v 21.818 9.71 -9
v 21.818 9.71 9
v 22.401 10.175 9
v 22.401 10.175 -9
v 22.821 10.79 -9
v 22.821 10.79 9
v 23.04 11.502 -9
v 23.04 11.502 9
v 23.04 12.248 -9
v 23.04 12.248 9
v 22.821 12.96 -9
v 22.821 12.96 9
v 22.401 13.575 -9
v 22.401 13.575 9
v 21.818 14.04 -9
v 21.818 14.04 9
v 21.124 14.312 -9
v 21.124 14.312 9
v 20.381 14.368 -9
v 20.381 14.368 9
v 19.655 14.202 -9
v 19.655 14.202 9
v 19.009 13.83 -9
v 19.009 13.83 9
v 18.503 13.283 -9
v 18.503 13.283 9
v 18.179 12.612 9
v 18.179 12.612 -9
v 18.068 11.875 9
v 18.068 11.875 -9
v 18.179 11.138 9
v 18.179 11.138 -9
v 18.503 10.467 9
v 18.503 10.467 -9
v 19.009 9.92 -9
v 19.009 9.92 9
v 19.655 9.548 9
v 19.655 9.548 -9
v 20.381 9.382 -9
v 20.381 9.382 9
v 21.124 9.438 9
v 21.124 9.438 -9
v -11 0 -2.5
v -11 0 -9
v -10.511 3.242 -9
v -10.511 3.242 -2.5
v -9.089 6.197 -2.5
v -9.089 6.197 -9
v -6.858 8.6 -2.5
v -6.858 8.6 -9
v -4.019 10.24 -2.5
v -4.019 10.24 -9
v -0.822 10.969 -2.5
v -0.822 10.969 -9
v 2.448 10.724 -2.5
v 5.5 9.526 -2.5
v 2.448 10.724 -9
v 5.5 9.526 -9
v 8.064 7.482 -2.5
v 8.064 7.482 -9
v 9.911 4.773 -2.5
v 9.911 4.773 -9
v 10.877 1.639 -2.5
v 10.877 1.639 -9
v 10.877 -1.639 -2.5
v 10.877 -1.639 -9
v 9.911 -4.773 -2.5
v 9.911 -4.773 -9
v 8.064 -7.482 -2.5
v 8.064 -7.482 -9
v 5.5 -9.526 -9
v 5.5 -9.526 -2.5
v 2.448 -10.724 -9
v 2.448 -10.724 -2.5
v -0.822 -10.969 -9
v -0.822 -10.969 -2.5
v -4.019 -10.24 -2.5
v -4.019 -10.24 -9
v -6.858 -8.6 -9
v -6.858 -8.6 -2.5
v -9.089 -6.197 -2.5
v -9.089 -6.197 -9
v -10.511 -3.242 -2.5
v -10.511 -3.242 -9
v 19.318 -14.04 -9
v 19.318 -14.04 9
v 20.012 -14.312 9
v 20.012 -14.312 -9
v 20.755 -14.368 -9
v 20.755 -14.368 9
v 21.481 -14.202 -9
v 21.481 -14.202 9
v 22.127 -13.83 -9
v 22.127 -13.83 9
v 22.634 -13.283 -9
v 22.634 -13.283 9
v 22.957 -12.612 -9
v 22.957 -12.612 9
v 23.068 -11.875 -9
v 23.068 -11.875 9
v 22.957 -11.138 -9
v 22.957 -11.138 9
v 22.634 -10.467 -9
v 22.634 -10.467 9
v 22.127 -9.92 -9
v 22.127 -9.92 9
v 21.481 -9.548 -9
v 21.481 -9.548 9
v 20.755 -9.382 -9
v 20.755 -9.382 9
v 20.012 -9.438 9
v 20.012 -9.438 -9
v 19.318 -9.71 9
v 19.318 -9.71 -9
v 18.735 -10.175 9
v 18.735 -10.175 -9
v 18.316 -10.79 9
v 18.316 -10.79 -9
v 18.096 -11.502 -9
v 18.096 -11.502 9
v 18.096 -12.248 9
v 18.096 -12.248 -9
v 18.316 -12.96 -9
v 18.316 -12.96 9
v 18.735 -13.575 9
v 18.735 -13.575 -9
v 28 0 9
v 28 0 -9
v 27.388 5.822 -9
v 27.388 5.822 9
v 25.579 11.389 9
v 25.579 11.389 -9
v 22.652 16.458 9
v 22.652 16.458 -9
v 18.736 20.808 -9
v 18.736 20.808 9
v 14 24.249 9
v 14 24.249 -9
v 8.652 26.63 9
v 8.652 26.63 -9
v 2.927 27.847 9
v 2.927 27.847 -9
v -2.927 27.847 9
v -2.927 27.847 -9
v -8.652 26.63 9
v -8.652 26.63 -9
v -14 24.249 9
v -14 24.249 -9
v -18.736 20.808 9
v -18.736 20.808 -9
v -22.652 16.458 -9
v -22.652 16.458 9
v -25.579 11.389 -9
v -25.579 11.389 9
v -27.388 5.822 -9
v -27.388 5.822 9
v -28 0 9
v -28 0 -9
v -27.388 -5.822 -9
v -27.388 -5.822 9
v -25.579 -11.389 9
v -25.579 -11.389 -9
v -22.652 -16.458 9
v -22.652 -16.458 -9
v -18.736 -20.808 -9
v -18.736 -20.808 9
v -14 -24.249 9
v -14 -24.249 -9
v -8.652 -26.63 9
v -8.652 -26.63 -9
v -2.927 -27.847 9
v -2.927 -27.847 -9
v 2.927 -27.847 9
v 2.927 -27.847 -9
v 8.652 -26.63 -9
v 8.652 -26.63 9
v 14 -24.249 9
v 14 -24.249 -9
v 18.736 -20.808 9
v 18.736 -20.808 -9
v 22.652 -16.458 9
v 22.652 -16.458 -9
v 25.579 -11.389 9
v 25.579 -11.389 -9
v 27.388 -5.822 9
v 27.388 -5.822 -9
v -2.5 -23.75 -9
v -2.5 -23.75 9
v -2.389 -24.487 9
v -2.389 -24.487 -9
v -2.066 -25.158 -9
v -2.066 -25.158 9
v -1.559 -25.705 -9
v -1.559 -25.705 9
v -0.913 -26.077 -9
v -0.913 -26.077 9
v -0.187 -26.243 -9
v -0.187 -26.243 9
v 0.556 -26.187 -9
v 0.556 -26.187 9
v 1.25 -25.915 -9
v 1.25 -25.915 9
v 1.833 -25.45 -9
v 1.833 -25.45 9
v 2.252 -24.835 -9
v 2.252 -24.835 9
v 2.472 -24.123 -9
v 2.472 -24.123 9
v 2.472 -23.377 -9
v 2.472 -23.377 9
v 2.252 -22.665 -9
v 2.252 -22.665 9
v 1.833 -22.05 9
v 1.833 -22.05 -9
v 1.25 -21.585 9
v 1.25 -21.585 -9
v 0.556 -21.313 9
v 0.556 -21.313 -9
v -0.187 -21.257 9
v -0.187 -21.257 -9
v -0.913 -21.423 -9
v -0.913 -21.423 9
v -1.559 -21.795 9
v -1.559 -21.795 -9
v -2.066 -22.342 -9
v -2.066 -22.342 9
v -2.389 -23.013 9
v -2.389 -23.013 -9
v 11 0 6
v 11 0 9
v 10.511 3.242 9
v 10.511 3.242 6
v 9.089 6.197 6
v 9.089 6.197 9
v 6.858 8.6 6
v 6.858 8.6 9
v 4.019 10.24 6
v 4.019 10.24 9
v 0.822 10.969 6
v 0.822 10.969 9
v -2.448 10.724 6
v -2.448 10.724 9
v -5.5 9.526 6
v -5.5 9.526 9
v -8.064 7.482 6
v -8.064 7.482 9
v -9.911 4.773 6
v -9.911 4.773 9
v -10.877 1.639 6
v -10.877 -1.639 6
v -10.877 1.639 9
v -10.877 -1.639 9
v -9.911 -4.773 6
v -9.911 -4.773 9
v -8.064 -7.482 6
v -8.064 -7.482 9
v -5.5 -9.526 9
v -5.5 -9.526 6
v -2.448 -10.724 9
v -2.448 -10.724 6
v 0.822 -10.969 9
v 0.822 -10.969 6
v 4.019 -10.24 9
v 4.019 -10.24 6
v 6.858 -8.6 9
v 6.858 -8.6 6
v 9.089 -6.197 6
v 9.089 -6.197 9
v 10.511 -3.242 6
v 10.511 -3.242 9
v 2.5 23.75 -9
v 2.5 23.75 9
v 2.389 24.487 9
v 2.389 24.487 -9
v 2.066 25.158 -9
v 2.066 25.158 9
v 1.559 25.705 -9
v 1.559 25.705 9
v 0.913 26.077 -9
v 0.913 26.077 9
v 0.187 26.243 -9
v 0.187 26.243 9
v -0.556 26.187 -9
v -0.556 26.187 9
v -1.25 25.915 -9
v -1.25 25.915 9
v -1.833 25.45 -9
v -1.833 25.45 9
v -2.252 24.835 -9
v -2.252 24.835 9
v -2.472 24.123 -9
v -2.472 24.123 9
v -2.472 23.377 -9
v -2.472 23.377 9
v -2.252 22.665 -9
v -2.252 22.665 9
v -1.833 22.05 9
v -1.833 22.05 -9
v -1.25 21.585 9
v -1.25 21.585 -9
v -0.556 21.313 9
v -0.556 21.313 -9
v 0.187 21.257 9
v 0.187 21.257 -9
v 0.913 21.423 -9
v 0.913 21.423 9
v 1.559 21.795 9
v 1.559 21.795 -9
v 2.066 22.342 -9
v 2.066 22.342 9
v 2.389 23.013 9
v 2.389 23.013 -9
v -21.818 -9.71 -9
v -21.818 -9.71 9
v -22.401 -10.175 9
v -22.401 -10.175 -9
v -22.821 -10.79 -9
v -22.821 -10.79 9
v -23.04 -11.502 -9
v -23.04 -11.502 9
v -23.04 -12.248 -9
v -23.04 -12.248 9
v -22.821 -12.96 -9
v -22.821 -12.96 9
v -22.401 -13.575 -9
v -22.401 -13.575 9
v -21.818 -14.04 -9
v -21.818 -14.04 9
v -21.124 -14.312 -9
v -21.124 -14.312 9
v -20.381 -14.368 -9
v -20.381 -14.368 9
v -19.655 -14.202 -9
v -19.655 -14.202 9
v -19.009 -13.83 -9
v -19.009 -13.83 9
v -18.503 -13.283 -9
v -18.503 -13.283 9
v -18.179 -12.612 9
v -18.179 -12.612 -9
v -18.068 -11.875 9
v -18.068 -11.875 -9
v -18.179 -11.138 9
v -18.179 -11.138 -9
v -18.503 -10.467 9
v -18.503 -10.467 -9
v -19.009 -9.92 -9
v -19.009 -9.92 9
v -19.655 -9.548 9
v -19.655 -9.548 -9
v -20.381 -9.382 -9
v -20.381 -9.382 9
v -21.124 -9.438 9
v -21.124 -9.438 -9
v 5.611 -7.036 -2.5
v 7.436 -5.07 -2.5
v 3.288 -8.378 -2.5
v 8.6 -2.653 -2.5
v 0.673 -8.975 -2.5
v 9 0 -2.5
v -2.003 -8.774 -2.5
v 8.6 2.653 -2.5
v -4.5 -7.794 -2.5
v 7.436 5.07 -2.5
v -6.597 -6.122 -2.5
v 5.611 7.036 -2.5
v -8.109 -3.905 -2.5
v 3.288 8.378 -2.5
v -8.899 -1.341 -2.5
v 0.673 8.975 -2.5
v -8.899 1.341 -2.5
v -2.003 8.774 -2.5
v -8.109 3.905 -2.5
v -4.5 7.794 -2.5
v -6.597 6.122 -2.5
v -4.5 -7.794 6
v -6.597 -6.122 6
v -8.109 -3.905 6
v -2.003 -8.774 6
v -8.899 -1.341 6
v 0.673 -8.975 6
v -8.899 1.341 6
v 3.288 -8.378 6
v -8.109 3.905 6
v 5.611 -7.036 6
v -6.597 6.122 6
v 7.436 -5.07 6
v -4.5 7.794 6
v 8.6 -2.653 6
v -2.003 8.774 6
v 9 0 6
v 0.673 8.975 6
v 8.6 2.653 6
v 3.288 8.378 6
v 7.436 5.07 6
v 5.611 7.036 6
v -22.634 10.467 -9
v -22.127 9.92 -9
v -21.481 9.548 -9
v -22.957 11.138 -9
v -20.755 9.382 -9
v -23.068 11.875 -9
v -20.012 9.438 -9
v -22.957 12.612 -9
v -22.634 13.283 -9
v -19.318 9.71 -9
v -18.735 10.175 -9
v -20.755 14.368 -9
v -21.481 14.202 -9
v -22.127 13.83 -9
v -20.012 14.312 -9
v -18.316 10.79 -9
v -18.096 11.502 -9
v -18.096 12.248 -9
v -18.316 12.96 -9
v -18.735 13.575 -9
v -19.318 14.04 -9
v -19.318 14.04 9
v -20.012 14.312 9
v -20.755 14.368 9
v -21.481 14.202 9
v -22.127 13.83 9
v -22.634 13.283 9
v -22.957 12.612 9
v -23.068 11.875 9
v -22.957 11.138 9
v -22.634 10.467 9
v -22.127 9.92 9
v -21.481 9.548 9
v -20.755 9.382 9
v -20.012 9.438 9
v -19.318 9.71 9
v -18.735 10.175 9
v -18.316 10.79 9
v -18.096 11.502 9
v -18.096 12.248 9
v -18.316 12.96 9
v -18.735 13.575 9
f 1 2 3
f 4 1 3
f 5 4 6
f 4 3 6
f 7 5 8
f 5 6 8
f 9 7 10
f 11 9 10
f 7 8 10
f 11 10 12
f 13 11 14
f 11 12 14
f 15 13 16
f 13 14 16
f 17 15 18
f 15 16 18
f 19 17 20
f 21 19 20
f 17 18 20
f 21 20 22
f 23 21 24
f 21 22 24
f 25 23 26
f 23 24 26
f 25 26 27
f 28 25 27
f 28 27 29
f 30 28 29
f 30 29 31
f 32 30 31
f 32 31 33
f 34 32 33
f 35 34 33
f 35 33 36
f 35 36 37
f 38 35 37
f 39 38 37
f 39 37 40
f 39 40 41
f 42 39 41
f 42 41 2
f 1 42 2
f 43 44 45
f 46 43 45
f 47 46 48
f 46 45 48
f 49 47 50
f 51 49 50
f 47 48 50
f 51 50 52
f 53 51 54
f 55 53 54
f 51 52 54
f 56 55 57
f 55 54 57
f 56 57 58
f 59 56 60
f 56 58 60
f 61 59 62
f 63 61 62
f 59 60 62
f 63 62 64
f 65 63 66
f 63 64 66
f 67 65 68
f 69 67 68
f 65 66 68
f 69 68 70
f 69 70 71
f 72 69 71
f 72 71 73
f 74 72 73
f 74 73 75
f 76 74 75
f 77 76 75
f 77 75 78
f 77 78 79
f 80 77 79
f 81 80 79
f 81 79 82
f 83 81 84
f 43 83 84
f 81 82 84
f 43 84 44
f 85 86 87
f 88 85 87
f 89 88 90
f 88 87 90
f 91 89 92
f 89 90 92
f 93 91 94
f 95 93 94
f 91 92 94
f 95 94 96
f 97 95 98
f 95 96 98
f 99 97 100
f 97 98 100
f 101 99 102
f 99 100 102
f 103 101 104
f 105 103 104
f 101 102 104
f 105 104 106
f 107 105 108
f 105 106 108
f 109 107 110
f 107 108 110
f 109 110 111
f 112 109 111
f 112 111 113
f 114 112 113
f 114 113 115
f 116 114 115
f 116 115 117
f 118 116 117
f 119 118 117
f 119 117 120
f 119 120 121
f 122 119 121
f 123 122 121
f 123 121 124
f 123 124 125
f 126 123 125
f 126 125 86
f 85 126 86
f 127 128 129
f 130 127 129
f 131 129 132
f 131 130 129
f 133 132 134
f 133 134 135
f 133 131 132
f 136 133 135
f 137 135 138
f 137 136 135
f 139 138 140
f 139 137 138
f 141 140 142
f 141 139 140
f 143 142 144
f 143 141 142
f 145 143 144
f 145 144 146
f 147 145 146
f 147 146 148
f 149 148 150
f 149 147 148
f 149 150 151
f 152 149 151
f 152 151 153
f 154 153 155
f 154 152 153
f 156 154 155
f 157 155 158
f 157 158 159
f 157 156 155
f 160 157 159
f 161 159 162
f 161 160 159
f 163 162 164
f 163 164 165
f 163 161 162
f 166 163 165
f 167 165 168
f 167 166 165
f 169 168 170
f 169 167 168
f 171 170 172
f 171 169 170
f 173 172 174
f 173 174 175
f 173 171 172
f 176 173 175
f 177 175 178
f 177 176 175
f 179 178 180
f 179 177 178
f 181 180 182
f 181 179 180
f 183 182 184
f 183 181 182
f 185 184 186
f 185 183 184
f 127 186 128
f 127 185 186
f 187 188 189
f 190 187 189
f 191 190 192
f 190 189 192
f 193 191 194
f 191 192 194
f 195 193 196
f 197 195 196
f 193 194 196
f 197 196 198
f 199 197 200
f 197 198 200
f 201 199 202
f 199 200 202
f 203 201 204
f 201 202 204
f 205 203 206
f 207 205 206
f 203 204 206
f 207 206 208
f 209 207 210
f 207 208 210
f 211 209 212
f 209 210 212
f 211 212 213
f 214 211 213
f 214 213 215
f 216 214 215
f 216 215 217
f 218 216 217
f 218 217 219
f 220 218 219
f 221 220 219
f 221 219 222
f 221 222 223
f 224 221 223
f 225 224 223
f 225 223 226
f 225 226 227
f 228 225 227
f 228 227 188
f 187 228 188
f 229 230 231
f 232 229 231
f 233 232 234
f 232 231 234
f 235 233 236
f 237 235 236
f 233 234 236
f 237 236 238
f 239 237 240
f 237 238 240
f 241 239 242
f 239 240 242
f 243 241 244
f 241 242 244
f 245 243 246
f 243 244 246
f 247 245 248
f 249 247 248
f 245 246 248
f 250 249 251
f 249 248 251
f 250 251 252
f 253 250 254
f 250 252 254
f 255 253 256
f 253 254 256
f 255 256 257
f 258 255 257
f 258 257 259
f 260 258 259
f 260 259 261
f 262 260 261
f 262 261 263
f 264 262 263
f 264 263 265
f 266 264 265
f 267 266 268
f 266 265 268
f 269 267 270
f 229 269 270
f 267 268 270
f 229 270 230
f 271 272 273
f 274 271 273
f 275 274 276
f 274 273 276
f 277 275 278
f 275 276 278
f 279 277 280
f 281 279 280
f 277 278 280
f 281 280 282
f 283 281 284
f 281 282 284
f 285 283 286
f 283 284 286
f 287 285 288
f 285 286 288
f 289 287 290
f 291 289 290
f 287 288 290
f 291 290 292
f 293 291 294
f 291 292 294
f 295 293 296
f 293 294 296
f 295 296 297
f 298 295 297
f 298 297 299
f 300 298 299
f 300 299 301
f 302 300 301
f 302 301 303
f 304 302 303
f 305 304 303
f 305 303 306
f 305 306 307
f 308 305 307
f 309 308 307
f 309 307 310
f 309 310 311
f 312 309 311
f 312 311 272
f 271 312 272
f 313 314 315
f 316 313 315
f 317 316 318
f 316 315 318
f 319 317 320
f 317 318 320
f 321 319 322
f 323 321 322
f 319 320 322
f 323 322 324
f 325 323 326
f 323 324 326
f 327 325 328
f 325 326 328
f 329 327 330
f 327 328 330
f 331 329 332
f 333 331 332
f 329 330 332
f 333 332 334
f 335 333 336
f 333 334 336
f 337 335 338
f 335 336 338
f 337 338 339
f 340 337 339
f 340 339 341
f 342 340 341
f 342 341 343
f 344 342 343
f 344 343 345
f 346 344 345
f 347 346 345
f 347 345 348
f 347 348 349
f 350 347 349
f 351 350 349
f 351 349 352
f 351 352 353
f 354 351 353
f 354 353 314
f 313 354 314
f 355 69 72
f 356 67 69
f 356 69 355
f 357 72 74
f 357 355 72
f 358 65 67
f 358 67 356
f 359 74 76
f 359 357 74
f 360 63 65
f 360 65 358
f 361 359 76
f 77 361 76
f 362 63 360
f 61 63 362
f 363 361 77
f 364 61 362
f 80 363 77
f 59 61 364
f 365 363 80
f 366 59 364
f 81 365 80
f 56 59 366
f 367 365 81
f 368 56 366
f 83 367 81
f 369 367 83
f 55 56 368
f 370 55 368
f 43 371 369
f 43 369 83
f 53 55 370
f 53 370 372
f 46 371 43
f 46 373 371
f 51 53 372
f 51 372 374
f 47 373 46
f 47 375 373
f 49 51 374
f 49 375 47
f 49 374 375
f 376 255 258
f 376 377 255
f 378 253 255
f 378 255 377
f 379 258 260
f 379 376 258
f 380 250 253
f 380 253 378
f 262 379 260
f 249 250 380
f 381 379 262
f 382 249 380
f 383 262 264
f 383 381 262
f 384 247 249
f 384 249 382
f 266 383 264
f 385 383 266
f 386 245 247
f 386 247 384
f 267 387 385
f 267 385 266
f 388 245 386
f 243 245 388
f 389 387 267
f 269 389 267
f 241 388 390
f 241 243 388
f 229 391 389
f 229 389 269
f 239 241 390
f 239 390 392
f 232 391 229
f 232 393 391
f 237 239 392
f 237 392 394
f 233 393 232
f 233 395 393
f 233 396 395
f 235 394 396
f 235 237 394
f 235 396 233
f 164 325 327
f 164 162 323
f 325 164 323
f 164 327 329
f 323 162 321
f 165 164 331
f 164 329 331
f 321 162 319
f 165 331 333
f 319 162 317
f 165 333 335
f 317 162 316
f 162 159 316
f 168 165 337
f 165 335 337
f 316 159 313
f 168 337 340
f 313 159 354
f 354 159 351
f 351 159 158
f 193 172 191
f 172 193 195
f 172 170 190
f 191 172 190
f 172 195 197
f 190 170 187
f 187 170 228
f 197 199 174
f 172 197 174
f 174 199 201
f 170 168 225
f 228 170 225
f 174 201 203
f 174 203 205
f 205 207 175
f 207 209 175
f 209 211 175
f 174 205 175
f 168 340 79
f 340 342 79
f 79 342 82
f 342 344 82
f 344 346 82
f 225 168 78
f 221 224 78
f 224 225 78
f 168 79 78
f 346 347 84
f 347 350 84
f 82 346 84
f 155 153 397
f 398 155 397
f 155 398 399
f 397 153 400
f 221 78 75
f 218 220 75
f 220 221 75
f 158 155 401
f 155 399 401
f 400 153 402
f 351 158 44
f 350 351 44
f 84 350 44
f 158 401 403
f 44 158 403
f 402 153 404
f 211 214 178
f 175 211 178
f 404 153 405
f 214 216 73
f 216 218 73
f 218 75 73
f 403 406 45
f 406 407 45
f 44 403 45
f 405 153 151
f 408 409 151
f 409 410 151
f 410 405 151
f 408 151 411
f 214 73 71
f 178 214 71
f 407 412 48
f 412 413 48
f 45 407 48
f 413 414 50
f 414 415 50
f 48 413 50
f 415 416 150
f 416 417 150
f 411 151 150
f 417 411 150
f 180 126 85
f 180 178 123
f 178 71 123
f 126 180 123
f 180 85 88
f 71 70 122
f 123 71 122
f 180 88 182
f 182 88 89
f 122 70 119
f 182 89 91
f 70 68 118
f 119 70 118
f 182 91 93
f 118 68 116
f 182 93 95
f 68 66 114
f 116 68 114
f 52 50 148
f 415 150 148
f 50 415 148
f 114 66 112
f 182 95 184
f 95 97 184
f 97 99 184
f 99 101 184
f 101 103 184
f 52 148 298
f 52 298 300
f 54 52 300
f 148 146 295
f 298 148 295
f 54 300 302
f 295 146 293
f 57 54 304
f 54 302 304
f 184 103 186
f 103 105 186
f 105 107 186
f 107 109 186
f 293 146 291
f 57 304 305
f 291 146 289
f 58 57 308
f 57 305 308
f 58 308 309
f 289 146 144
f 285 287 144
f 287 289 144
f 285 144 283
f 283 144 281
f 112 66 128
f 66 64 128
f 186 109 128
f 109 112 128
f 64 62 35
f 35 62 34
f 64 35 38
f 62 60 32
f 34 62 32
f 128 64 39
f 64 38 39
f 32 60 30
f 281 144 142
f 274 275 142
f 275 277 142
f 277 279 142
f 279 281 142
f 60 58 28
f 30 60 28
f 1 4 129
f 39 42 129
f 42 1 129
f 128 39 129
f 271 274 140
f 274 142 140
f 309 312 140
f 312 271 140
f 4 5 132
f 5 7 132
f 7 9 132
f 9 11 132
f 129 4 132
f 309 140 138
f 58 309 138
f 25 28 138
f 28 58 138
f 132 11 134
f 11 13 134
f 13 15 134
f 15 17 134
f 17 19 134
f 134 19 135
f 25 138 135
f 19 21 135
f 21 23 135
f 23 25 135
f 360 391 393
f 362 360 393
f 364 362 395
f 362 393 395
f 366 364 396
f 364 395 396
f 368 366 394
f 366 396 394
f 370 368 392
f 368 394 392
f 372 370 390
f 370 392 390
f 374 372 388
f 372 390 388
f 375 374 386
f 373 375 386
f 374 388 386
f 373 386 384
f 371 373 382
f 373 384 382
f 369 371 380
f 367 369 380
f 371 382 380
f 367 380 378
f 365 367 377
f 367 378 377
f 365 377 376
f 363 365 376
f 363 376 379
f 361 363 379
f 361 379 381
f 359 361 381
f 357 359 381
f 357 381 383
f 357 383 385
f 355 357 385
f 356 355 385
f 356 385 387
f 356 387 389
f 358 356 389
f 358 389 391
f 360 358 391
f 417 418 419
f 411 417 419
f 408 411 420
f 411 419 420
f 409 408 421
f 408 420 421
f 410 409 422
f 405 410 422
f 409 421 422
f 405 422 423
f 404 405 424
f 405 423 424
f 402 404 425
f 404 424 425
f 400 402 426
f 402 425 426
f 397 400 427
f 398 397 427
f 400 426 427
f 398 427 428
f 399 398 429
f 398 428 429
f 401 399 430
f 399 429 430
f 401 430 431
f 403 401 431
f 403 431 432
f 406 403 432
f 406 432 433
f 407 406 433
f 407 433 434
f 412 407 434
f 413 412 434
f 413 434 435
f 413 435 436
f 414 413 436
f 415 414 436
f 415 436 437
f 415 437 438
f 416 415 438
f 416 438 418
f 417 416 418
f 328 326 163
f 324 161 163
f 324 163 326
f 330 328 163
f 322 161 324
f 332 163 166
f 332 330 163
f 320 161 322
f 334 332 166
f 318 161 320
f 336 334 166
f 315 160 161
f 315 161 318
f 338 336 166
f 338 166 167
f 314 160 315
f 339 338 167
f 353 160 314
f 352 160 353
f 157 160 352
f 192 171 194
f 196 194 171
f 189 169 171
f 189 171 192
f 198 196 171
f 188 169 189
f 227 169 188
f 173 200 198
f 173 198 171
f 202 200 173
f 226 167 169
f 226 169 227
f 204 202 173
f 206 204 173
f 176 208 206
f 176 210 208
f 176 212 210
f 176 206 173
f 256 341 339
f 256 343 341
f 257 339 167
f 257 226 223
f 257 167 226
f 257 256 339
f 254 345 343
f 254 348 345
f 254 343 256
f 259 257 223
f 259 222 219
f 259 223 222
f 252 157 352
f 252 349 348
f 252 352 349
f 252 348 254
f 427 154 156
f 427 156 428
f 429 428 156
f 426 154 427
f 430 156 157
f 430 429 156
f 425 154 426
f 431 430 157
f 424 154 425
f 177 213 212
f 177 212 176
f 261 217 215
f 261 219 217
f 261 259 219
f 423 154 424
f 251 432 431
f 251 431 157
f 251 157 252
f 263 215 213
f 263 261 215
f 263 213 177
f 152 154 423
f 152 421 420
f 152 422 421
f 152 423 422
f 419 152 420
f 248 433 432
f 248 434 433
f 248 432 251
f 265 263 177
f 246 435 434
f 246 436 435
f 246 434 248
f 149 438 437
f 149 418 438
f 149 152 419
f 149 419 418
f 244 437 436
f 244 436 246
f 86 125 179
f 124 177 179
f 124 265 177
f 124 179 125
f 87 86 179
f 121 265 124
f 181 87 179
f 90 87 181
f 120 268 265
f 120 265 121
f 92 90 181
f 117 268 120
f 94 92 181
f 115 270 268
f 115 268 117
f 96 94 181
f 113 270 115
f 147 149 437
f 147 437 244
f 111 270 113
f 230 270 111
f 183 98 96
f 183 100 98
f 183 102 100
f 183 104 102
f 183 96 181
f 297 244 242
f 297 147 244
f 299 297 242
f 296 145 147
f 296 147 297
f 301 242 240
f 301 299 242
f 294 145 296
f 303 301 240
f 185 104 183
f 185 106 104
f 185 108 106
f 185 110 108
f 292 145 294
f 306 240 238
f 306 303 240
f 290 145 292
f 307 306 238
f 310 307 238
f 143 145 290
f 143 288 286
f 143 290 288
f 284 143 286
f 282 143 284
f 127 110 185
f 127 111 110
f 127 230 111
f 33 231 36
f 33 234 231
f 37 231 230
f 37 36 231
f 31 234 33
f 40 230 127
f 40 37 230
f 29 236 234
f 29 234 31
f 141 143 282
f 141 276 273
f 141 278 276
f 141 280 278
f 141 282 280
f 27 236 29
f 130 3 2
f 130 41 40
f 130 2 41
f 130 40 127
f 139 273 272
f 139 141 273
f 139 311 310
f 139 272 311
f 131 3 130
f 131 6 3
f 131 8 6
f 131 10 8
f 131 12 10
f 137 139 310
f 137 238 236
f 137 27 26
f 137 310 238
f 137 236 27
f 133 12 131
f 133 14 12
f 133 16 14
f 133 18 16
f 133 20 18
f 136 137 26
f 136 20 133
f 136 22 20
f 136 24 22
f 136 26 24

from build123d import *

# Parameters (mm, degrees)
SKETCH1_R                = 28
BOSS_EXTRUDE1_DEPTH      = 9
SKETCH2_R                = 11
CUT_EXTRUDE1_DEPTH       = 3
SKETCH3_R                = 9
CUT_EXTRUDE2_DEPTH       = 16
SKETCH4_R                = 11
CUT_EXTRUDE3_DEPTH       = 6.5
SKETCH_1_R               = 2.5
CUT_EXTRUDE_1_DEPTH      = 19
PATTERN_CIRCULAR_1_COUNT = 6


with BuildPart() as part:
    # Sketch1 → Boss-Extrude1 (new body, symmetric)
    with BuildSketch(Plane.XY):
        Circle(SKETCH1_R)
    extrude(amount=BOSS_EXTRUDE1_DEPTH, both=True)

    # Sketch2 → Cut-Extrude1 (cut)
    with BuildSketch(Plane.XY.offset(9)):
        Circle(SKETCH2_R)
    extrude(amount=-CUT_EXTRUDE1_DEPTH, mode=Mode.SUBTRACT)

    # Sketch3 → Cut-Extrude2 (cut, through all)
    with BuildSketch(Plane.XY.offset(6)):
        Circle(SKETCH3_R)
    extrude(amount=-CUT_EXTRUDE2_DEPTH, mode=Mode.SUBTRACT)

    # Sketch4 → Cut-Extrude3 (cut)
    with BuildSketch(Plane(origin=(0, 0, -9), x_dir=(-1, 0, 0), z_dir=(0, 0, -1))):
        Circle(SKETCH4_R)
    extrude(amount=-CUT_EXTRUDE3_DEPTH, mode=Mode.SUBTRACT)

    # 草圖1 → 除料-伸長1 (cut, through all)
    with BuildSketch(Plane.XY.offset(9)):
        with Locations((0, 23.75)):
            Circle(SKETCH_1_R)
    cut_extrude_1 = extrude(amount=-CUT_EXTRUDE_1_DEPTH, mode=Mode.SUBTRACT)

    # 環狀複製排列1: 除料-伸長1 ×6 about axis
    pattern_circular_1_axis = Axis((0, 0, 0), (0, 0, 1))
    for i in range(1, PATTERN_CIRCULAR_1_COUNT):
        add(cut_extrude_1.rotate(pattern_circular_1_axis, i * 360 / PATTERN_CIRCULAR_1_COUNT), mode=Mode.SUBTRACT)


solid = part.part
